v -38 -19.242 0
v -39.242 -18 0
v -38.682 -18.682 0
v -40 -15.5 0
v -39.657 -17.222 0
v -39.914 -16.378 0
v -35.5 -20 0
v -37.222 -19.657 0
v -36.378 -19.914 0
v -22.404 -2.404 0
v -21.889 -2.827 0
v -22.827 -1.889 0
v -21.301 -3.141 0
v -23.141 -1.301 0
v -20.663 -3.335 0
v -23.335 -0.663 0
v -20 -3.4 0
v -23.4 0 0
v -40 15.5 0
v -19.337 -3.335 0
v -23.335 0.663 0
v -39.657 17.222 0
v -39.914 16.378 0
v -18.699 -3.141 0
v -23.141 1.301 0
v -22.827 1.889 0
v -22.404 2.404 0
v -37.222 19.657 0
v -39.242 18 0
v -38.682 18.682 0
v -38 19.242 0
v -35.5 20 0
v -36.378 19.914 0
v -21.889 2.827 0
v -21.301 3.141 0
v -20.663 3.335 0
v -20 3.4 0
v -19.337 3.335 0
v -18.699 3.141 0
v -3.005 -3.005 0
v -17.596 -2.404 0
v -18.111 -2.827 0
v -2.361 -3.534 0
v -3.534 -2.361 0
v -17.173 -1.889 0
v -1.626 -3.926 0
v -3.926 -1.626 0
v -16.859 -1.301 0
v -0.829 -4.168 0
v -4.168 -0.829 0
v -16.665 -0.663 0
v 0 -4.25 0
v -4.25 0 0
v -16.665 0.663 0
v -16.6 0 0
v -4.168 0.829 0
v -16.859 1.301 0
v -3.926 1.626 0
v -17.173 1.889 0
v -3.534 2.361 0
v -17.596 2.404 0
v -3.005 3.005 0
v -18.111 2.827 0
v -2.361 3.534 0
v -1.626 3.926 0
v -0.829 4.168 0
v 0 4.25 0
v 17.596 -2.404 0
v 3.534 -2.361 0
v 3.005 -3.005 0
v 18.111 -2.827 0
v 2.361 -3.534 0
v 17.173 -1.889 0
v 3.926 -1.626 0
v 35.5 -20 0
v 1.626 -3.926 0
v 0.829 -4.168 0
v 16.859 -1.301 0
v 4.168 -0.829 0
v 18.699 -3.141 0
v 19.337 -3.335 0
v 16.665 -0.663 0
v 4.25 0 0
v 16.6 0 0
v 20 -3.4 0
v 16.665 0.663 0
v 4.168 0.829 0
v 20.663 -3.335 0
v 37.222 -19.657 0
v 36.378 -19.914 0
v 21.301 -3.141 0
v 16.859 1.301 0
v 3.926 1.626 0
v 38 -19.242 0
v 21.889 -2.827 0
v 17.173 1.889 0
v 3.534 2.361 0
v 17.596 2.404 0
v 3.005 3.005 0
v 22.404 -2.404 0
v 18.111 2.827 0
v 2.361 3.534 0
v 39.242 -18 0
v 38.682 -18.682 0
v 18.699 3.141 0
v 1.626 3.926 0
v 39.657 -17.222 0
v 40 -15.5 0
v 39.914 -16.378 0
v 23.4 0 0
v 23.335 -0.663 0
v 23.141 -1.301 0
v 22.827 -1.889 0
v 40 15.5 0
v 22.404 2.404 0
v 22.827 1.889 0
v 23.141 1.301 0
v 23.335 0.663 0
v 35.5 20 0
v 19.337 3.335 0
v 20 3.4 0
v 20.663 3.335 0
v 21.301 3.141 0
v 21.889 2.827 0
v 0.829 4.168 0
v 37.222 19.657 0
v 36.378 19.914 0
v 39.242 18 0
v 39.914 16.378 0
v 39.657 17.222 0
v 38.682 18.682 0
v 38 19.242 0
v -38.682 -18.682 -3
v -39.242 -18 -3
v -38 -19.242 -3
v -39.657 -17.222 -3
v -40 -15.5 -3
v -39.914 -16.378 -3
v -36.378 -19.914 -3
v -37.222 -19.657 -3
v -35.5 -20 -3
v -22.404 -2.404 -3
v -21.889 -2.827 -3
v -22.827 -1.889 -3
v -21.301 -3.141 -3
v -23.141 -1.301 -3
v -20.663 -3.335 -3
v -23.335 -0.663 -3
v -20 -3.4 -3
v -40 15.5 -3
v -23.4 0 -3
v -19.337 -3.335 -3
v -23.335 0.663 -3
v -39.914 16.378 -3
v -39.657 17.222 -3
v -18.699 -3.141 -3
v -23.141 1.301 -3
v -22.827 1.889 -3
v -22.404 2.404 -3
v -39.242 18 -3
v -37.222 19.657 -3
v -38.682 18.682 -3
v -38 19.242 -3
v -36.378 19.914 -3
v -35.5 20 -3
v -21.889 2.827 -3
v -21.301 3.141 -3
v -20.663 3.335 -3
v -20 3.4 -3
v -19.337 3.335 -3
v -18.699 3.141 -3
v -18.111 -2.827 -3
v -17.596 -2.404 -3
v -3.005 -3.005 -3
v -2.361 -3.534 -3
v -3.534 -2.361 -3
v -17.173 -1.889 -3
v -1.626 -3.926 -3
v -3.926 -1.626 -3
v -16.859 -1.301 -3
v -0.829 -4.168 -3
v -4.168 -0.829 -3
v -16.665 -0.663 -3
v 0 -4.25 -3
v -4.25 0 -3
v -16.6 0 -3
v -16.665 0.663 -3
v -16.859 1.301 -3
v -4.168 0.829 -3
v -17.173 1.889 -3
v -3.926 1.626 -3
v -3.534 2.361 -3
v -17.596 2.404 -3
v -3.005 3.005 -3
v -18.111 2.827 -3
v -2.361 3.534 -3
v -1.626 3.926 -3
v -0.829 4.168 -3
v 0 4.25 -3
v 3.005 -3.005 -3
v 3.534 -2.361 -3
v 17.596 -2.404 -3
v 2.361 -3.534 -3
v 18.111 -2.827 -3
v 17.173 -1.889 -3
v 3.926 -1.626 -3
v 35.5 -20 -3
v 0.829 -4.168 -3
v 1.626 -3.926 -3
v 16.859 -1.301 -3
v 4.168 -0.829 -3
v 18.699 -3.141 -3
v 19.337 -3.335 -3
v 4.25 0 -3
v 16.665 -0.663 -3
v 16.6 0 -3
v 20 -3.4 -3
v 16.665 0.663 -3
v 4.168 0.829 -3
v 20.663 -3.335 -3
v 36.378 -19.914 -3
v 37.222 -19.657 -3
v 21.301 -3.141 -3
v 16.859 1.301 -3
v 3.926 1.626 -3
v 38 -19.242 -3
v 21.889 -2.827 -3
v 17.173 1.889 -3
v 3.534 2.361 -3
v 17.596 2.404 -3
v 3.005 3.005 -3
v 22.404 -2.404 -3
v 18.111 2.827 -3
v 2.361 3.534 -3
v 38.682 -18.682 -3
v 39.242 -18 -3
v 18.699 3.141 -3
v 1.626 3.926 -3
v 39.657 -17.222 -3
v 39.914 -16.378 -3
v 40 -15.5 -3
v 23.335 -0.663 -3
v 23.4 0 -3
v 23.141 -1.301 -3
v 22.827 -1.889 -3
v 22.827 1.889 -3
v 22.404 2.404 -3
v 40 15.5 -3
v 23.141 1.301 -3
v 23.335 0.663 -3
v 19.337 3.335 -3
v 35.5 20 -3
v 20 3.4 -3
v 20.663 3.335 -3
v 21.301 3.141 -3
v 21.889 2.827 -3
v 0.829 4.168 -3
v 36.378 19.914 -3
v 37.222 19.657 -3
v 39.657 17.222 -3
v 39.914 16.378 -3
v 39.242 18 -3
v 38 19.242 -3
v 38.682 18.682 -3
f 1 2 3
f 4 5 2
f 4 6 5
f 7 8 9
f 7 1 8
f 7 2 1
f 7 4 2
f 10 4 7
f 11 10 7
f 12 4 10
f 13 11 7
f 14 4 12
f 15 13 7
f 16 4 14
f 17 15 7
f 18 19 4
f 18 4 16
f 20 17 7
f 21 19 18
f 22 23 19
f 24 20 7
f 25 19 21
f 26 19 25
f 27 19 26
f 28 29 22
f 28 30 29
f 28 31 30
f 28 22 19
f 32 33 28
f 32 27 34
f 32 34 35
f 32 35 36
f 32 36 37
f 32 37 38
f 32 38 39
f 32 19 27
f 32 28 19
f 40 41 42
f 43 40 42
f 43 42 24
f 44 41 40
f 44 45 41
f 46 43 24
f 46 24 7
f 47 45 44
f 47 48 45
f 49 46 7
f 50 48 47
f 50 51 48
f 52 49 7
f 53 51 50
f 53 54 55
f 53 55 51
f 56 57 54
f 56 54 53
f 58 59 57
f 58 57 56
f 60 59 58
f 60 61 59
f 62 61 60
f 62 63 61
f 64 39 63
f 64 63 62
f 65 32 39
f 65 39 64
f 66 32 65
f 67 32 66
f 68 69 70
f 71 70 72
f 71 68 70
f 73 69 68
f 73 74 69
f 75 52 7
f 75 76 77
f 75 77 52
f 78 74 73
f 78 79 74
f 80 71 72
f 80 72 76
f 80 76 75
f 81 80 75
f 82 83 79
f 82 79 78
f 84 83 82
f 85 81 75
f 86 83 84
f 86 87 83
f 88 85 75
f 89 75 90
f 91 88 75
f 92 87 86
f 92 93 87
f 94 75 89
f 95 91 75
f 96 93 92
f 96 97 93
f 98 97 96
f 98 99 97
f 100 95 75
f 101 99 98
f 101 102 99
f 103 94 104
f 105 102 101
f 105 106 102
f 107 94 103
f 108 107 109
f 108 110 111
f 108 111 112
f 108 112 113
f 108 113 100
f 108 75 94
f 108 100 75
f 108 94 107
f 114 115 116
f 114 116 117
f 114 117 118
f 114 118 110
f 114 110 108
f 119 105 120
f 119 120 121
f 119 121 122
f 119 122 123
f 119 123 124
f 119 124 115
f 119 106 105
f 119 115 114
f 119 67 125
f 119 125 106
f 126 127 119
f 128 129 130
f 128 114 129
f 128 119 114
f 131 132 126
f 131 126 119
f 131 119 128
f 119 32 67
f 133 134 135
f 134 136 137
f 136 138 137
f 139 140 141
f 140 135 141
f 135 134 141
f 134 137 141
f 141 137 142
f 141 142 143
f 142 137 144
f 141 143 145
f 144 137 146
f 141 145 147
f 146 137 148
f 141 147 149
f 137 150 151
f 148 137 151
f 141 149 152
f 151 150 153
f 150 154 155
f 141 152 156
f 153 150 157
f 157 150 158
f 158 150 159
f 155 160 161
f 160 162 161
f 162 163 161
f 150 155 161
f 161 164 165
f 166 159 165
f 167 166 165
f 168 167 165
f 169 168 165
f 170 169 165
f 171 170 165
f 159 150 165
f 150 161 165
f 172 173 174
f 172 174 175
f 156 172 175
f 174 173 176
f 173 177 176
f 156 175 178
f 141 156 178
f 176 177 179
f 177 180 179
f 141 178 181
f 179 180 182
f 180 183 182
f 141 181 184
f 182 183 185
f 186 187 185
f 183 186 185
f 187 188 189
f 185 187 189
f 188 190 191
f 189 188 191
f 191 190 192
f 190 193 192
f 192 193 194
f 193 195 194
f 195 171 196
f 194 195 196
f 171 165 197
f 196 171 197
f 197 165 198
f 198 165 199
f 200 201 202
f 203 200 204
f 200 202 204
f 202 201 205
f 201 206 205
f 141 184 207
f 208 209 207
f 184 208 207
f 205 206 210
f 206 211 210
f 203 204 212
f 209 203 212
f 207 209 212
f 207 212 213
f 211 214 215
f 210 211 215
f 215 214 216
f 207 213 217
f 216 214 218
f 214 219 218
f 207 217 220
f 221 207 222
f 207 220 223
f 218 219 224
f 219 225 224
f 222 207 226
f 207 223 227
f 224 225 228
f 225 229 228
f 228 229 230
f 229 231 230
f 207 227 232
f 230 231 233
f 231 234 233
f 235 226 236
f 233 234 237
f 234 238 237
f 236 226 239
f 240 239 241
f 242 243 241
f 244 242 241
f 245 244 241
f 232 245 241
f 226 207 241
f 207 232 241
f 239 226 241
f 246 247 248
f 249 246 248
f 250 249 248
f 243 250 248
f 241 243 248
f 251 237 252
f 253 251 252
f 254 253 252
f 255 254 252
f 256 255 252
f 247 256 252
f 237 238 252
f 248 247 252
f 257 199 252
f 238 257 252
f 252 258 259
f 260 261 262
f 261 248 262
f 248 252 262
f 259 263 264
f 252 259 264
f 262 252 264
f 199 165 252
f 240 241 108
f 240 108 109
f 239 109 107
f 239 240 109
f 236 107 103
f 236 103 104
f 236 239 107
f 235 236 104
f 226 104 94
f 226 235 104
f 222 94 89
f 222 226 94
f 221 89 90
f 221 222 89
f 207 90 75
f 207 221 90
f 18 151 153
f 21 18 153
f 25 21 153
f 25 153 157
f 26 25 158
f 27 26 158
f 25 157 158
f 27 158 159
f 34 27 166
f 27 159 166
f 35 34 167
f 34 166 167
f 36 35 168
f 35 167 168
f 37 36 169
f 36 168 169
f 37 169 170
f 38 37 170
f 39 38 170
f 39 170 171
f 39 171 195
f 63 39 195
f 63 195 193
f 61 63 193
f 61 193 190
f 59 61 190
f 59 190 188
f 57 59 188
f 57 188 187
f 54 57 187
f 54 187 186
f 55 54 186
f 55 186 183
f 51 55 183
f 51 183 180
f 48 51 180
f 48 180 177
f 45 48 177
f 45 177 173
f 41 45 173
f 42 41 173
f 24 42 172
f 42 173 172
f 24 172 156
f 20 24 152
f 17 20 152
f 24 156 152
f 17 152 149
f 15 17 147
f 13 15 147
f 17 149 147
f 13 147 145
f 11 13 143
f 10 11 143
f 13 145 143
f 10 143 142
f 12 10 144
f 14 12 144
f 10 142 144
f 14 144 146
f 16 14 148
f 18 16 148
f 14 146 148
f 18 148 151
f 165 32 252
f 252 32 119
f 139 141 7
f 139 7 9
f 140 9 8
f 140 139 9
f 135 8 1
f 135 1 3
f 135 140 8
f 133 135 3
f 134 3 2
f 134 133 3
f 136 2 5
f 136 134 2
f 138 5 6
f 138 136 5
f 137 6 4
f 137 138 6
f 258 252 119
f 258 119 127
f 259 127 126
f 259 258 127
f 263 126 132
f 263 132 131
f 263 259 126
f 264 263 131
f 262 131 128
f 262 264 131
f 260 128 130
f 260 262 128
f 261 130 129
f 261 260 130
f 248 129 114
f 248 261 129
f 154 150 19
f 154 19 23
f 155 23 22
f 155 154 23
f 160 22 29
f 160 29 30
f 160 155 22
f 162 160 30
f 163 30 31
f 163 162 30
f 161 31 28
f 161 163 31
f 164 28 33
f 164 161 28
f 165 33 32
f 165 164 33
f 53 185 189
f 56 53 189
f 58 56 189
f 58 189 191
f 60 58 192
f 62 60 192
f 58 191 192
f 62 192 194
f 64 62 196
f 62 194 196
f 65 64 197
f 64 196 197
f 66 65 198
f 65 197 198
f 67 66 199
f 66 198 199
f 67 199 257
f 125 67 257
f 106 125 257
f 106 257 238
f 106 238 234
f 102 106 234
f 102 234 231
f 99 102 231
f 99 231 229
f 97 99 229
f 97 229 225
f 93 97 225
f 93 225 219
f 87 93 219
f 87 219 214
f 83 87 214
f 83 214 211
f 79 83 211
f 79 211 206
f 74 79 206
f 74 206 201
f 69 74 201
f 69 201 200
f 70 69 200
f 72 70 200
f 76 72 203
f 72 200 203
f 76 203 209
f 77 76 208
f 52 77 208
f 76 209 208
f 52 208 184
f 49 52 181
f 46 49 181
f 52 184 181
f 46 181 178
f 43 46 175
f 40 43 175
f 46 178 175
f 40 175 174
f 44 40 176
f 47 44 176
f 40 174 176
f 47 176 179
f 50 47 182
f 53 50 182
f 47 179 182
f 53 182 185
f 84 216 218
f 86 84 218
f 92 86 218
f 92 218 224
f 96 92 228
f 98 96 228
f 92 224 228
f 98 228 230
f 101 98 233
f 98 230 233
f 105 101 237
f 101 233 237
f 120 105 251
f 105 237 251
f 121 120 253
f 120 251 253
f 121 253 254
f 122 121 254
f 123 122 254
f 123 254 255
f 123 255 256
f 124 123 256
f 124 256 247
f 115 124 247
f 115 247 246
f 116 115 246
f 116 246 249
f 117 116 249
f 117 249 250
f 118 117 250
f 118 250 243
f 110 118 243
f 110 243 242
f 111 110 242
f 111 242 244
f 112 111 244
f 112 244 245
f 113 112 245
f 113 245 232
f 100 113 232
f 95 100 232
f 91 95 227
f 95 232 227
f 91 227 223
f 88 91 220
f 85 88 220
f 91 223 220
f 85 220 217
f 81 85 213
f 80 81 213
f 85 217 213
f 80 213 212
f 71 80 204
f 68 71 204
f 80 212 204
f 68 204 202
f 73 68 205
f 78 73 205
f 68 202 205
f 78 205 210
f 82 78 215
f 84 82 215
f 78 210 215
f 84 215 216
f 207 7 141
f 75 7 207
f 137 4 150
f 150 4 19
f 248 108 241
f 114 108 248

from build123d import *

# Parameters (mm, degrees)
SKETCH_1_W             = 80
SKETCH_1_H             = 40
SM_BASE_FLANGE_1_DEPTH = 3
OTHER_START            = -3
OTHER_1_DEPTH          = 3
HOLE_WIZARD_M8_1_D     = 6.8
HOLE_WIZARD_M10_1_D    = 8.5


# Read off the part's stored shape, not the designer's step: 断开-边角1
# Sheet-metal steps are written as plain solids
with BuildPart() as part:
    # Sketch 1 → 基体-法兰1 (new body)
    with BuildSketch(Plane.XY):
        Rectangle(SKETCH_1_W, SKETCH_1_H)
    extrude(amount=-SM_BASE_FLANGE_1_DEPTH)

    # Other 1 outline → Other 1 (cut)
    with BuildSketch(Plane.XY.offset(OTHER_START)):
        with BuildLine():
            ThreePointArc((40, -15.5), (38.681980515, -18.681980515), (35.5, -20))
            Line((35.5, -20), (40, -20))
            Line((40, -20), (40, -15.5))
        make_face()
        with BuildLine():
            Line((-40, -20), (-35.5, -20))
            ThreePointArc((-35.5, -20), (-38.681980515, -18.681980515), (-40, -15.5))
            Line((-40, -15.5), (-40, -20))
        make_face()
        with BuildLine():
            ThreePointArc((35.5, 20), (38.681980515, 18.681980515), (40, 15.5))
            Line((40, 15.5), (40, 20))
            Line((40, 20), (35.5, 20))
        make_face()
        with BuildLine():
            Line((-40, 20), (-40, 15.5))
            ThreePointArc((-40, 15.5), (-38.681980515, 18.681980515), (-35.5, 20))
            Line((-35.5, 20), (-40, 20))
        make_face()
    extrude(amount=OTHER_1_DEPTH, mode=Mode.SUBTRACT)

    # M8 螺纹孔1 (through all)
    with Locations(Plane.XY):
        with Locations((-20, 0), (20, 0)):
            Hole(HOLE_WIZARD_M8_1_D / 2)

    # M10 螺纹孔1 (through all)
    with Locations(Plane.XY):
        with Locations((0, 0)):
            Hole(HOLE_WIZARD_M10_1_D / 2)


solid = part.part
